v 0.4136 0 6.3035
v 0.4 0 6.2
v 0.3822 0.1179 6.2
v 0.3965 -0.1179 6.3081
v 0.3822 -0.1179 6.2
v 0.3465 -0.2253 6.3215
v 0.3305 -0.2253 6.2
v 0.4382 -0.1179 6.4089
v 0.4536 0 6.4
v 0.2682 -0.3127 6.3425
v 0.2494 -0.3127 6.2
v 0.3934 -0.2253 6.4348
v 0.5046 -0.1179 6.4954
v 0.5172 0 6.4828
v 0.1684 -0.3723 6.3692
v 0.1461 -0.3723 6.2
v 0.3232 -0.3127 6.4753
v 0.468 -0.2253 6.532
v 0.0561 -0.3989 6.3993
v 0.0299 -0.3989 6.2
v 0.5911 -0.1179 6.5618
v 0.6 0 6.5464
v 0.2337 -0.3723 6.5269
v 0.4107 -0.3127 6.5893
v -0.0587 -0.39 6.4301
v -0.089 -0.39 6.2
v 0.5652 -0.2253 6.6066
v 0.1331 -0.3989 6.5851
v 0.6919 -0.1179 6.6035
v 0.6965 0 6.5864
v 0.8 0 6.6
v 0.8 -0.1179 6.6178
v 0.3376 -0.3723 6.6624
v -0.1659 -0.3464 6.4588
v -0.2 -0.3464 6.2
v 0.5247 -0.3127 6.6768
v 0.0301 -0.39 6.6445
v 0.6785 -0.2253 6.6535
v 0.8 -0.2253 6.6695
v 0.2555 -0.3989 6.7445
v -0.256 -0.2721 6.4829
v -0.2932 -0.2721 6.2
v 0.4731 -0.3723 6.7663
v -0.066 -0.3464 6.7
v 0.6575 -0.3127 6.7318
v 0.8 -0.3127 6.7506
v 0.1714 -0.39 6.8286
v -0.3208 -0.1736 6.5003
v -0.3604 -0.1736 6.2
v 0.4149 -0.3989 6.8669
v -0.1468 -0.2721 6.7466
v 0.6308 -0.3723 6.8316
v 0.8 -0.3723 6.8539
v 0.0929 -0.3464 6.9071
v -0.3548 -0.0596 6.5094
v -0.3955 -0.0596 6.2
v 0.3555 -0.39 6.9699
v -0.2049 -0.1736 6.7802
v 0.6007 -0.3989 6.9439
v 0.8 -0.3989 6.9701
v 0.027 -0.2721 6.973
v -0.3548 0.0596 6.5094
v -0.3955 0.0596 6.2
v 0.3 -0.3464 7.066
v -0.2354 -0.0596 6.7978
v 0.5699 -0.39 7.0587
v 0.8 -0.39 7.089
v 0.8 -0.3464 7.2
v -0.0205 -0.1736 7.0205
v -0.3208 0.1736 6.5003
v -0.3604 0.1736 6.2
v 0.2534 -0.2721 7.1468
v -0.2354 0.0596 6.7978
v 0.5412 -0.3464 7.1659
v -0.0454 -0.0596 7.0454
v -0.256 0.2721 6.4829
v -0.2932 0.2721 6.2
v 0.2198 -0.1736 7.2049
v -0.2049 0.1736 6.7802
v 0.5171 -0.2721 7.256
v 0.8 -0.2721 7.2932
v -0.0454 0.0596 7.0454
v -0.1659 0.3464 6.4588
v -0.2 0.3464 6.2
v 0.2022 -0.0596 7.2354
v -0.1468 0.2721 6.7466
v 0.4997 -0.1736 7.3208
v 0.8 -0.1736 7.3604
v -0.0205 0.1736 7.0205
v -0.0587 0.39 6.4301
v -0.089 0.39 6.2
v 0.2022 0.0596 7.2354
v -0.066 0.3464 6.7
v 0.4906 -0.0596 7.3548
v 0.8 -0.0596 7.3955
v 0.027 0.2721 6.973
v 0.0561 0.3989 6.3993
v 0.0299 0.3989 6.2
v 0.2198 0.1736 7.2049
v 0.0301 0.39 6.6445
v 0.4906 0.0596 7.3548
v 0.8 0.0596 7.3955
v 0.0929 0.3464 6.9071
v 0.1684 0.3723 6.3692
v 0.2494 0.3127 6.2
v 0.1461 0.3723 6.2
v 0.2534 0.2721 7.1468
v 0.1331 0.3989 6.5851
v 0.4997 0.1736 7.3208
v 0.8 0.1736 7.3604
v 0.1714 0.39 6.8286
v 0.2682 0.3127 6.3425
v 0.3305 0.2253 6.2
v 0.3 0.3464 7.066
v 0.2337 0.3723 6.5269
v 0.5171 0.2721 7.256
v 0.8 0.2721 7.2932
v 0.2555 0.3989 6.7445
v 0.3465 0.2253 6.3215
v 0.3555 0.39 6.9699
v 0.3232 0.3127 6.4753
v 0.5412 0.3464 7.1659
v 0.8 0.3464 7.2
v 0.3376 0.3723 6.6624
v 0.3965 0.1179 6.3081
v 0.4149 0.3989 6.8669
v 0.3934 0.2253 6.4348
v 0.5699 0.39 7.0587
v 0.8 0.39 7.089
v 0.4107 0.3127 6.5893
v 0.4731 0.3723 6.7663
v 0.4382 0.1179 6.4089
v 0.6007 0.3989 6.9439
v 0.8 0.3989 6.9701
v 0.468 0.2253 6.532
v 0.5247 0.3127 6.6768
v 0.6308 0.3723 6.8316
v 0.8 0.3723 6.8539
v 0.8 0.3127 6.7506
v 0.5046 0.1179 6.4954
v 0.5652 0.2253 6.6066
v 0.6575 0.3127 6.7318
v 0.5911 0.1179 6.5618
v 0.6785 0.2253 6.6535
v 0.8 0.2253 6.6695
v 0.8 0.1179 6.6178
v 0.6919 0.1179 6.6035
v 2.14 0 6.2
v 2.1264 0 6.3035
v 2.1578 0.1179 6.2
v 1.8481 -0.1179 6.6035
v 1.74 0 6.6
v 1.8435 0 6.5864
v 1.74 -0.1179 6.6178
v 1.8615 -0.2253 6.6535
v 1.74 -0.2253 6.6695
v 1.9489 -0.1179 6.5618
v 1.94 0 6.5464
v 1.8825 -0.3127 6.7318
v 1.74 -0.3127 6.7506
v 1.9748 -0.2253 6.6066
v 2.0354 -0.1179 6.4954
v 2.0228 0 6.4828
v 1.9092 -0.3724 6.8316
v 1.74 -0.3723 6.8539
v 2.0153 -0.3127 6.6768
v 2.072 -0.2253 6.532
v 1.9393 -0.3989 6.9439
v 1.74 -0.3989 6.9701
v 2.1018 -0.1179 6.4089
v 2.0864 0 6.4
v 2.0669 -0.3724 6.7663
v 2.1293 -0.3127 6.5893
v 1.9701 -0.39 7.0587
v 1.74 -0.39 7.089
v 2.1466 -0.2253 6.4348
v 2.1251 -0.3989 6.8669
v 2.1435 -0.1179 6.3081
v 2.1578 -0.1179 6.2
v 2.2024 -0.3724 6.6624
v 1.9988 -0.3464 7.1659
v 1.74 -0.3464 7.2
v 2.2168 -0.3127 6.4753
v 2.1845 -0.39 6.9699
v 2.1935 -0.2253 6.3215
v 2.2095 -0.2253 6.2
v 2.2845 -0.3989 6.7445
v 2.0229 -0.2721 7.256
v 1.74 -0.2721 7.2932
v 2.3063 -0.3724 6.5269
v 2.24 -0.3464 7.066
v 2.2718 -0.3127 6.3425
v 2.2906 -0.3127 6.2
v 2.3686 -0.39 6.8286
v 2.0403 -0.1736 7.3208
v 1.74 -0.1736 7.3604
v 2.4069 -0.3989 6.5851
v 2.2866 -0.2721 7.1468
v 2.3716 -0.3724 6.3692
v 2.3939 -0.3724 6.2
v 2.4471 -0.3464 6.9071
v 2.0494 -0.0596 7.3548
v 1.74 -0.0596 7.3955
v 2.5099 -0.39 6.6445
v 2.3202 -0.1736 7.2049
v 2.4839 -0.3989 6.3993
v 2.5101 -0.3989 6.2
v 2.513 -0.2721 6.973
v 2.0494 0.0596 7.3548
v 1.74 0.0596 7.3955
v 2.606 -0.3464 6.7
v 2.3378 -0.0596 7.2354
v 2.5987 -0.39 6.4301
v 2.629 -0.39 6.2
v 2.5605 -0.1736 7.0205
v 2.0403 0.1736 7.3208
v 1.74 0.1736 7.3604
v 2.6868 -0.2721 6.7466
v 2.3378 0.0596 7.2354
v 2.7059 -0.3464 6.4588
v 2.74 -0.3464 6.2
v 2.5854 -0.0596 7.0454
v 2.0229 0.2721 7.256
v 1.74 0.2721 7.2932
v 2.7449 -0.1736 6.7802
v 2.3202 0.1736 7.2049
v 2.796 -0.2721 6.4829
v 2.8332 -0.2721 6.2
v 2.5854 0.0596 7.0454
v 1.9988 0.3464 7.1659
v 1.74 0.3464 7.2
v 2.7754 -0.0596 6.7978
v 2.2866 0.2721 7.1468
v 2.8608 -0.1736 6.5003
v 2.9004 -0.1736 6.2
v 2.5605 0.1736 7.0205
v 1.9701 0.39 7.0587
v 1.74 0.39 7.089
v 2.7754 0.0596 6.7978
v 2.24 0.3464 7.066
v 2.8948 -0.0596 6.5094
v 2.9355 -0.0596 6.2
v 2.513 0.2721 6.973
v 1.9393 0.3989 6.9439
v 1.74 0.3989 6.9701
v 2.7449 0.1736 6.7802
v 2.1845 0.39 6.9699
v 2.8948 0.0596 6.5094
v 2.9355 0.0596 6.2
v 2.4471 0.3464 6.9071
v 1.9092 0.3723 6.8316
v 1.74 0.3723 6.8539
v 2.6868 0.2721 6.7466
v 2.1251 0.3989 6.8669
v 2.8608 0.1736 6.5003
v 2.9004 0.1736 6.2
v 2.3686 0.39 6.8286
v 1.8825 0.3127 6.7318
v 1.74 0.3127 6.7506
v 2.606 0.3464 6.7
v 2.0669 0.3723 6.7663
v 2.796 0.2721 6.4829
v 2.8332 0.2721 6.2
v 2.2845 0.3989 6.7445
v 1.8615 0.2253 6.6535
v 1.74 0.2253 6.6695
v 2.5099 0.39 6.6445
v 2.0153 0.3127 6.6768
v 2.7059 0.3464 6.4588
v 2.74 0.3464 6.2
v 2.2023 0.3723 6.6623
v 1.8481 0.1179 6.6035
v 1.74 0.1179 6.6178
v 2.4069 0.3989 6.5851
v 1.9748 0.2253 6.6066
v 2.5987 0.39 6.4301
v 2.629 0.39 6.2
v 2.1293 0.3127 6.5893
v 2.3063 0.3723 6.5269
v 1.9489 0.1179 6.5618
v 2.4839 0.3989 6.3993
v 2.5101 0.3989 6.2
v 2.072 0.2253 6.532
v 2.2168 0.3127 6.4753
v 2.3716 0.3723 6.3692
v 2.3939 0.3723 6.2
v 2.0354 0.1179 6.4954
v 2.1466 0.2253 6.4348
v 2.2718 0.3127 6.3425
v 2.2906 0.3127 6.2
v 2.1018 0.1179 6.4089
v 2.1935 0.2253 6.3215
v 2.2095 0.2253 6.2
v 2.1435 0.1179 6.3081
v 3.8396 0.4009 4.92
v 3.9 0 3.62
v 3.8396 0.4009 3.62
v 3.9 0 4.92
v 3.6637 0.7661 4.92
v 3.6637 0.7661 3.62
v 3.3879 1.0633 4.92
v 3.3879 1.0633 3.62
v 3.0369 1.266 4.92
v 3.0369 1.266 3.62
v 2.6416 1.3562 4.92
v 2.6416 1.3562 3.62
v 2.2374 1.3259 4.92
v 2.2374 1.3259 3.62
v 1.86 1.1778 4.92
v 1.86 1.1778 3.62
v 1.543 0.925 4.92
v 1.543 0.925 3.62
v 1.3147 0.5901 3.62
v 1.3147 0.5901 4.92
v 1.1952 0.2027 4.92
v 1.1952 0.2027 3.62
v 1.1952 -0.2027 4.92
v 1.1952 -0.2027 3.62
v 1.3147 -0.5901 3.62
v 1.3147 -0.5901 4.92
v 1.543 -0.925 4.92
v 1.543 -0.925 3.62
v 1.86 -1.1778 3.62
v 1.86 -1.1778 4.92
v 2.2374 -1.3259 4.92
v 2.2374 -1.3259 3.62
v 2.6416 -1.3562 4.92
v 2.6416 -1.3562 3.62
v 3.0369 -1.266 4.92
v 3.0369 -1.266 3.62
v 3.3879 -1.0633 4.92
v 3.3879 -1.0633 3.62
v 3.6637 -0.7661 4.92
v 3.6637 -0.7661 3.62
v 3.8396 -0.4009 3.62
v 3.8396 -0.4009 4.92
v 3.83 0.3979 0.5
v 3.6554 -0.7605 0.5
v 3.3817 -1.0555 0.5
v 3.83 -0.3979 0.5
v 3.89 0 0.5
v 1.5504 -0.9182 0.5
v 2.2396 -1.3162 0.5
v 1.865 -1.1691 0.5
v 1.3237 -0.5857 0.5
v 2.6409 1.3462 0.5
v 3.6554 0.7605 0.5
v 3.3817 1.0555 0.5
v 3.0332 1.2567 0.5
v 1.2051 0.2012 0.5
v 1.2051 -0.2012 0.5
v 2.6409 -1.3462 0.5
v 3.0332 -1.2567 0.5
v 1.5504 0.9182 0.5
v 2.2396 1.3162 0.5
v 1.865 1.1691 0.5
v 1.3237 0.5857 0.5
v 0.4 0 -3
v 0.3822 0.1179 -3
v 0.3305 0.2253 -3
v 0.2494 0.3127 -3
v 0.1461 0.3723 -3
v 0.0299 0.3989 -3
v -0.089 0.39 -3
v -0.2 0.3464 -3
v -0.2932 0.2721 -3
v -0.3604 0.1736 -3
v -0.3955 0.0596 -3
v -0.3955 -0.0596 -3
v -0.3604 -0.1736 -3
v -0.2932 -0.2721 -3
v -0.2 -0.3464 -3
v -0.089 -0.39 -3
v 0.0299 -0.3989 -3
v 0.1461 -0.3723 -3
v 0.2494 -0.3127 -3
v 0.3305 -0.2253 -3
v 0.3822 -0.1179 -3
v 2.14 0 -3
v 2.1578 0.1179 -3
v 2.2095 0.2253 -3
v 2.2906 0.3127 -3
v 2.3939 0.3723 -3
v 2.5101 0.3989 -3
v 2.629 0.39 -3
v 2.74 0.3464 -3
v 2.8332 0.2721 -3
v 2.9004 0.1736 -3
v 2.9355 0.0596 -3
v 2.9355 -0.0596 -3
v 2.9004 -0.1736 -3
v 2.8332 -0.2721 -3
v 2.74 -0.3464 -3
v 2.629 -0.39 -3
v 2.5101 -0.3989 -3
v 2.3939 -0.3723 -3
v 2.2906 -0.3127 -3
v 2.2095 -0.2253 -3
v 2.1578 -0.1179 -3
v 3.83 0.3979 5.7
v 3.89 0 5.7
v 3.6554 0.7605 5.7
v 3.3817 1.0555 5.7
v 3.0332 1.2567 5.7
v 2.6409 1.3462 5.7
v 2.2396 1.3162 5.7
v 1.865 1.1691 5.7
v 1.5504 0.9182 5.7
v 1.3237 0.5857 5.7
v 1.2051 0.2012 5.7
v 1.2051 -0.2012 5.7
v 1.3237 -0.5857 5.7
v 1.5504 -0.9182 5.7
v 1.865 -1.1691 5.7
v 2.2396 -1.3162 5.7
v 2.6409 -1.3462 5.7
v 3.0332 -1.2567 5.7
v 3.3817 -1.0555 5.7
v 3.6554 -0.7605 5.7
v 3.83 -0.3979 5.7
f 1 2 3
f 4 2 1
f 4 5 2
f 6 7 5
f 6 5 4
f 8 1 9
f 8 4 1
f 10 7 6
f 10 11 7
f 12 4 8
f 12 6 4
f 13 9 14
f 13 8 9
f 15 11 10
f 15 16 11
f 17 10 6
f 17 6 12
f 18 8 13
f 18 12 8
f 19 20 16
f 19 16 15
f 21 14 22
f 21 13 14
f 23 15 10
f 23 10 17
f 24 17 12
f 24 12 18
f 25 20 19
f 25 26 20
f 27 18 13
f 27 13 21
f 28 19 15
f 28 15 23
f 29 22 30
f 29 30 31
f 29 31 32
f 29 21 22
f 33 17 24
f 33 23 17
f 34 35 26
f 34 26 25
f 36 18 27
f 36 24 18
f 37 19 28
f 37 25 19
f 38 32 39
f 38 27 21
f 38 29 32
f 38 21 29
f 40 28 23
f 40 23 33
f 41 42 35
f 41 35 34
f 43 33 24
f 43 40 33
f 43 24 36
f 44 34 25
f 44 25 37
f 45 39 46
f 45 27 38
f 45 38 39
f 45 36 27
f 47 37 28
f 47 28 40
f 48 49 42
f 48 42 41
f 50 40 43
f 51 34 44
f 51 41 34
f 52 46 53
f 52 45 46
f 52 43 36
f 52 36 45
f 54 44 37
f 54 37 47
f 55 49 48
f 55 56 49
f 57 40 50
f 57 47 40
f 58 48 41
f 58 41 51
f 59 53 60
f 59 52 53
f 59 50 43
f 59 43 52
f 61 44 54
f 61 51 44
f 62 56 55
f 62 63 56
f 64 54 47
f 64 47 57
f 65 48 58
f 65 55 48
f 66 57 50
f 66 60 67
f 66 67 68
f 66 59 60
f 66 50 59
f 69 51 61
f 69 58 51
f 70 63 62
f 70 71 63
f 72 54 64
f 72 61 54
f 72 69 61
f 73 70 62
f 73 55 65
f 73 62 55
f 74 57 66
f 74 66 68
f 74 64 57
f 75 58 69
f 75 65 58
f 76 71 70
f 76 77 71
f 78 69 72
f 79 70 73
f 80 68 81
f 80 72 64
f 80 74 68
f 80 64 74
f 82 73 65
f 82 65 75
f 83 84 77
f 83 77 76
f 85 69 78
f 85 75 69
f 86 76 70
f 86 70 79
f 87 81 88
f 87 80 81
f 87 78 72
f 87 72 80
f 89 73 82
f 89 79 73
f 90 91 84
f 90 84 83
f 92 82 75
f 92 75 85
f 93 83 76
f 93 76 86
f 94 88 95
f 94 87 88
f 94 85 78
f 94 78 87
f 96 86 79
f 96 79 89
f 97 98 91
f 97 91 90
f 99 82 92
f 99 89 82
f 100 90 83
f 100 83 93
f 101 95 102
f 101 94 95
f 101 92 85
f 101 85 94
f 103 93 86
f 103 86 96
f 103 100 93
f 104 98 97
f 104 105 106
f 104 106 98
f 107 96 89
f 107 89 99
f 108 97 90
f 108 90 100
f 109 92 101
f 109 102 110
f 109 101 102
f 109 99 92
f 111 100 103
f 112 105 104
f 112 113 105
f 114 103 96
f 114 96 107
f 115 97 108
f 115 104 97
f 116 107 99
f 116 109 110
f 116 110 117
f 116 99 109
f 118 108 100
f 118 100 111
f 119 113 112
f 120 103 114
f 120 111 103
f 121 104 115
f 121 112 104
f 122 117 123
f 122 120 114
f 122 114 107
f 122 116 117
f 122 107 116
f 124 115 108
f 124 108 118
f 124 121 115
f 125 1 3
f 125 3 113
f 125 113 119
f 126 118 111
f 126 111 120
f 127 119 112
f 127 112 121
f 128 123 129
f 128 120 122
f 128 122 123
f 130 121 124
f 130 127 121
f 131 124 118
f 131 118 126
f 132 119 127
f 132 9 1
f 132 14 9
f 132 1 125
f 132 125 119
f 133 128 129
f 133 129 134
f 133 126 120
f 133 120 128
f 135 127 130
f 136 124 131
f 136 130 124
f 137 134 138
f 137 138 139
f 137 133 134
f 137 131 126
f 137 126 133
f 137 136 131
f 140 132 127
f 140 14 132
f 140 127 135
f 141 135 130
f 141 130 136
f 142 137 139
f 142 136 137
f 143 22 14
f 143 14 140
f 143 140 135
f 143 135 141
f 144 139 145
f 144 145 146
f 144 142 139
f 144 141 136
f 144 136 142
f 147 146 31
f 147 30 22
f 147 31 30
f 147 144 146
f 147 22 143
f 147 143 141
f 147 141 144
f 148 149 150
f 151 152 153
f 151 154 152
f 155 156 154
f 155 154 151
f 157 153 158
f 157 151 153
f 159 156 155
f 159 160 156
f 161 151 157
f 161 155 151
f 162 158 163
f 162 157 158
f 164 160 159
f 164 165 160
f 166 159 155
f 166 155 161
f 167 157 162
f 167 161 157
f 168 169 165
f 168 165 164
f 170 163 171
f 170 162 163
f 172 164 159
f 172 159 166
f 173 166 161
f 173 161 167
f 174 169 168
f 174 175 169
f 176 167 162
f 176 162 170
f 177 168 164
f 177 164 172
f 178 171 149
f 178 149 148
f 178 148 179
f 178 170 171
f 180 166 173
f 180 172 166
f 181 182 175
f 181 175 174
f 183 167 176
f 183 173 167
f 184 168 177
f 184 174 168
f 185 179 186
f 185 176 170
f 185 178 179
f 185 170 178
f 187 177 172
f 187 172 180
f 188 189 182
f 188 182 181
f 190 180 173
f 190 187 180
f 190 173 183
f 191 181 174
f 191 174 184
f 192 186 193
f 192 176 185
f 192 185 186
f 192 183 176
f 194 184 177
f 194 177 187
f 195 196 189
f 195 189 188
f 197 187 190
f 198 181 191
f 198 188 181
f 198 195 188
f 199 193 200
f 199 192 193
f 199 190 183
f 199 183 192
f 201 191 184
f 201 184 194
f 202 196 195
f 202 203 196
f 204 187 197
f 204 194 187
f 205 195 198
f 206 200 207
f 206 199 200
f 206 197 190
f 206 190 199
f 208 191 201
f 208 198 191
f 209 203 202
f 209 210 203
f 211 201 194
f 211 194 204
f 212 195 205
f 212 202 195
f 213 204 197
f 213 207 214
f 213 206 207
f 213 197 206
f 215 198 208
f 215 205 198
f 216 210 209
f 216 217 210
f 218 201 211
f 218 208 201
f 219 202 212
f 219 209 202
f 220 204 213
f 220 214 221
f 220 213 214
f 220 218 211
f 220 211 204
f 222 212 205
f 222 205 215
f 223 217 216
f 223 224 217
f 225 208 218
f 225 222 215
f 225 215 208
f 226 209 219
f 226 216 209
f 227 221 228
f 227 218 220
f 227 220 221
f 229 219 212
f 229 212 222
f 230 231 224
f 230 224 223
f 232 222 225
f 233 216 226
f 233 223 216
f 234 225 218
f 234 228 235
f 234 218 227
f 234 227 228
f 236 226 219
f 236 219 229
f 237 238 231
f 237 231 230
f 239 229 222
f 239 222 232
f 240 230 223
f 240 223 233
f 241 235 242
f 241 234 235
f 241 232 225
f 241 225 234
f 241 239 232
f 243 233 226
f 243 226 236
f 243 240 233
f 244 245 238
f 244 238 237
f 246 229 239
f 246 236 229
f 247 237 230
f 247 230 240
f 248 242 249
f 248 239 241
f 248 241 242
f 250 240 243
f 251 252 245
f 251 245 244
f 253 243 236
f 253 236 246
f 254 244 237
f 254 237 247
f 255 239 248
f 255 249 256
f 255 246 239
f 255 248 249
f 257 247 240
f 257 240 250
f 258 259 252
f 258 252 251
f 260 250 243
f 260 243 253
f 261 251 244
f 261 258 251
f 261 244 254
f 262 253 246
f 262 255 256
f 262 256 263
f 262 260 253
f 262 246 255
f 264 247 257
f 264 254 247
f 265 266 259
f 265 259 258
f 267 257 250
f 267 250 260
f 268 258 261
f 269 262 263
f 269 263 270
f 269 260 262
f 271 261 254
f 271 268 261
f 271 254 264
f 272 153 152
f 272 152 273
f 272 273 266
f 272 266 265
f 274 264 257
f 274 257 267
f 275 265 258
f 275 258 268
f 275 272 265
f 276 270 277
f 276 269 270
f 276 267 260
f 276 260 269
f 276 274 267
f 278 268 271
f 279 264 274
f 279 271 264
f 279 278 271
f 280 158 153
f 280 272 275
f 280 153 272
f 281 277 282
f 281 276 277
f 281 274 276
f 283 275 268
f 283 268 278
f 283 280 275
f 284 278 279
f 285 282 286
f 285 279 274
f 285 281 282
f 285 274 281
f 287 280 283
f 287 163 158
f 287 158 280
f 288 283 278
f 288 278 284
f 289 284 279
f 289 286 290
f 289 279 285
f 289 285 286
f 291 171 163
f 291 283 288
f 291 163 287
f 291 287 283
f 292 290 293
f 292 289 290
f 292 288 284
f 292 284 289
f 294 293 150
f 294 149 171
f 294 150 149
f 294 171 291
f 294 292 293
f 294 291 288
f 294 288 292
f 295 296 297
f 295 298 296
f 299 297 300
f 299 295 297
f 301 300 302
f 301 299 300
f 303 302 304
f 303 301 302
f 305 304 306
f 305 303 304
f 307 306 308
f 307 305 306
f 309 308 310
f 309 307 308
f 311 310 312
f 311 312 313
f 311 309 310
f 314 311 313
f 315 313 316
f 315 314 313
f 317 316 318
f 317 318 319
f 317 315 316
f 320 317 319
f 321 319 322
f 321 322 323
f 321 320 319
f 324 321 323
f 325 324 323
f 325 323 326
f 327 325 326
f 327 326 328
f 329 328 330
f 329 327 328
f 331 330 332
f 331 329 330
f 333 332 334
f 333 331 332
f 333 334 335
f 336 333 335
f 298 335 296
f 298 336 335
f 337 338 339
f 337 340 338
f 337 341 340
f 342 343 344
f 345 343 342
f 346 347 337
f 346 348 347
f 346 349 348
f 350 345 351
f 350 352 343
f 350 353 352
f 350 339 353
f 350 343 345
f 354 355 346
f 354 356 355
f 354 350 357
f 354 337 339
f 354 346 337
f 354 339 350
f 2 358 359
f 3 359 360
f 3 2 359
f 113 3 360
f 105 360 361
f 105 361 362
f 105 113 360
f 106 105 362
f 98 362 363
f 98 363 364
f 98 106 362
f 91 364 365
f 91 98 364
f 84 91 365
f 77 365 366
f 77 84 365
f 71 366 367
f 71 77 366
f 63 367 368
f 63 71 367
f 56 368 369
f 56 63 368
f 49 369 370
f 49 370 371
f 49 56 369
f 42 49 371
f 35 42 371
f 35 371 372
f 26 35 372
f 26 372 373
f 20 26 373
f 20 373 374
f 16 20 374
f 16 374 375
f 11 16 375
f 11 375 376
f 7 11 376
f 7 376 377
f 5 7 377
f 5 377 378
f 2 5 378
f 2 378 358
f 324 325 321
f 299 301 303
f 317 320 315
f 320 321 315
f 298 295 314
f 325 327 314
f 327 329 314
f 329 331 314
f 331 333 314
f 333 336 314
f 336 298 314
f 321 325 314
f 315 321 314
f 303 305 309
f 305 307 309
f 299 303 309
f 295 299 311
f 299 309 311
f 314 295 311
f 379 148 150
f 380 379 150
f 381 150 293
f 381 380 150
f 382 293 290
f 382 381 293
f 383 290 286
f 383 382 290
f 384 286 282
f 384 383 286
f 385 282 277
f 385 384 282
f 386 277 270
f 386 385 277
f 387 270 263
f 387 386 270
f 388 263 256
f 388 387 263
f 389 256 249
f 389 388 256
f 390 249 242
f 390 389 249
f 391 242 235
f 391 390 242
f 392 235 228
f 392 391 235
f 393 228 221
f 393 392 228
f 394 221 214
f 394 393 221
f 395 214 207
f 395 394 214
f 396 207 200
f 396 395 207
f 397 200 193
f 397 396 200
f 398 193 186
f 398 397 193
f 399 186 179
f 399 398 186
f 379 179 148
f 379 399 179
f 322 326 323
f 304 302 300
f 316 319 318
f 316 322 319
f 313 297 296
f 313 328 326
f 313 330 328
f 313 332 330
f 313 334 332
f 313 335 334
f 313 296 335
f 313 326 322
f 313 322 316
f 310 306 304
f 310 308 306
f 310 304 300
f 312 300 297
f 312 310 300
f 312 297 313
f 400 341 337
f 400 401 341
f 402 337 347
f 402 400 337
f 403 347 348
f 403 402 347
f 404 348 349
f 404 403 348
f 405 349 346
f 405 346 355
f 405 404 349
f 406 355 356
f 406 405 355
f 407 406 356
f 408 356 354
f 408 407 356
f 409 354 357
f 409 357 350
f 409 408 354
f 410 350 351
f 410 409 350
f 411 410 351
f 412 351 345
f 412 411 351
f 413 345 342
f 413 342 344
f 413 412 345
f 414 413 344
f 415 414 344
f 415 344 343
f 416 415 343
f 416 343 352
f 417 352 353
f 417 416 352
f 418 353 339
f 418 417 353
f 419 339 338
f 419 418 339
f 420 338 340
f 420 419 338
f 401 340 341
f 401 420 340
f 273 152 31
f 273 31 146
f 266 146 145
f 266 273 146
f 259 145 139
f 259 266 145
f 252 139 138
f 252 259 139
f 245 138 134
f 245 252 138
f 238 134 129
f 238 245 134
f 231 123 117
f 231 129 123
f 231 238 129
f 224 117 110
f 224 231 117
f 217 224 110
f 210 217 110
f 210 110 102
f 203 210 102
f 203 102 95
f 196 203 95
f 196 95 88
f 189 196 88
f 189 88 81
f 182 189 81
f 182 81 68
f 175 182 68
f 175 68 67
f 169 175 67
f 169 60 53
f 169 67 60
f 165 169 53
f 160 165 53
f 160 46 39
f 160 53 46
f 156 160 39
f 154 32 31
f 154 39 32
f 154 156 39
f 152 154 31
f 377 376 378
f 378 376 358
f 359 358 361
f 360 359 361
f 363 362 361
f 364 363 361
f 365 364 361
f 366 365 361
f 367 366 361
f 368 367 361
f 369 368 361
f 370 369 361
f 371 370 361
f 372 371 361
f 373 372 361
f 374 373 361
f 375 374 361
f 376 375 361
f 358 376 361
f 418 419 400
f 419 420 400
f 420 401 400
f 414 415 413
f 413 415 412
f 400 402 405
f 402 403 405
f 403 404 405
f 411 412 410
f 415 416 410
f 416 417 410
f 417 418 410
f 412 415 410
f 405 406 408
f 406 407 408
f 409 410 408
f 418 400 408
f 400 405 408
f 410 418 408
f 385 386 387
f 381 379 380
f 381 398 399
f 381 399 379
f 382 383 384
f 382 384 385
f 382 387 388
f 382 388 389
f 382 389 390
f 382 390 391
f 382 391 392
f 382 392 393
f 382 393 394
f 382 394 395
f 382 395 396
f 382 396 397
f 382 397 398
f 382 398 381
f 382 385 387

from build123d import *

# Parameters (mm, degrees)
SKETCH001_R = 0.4
SKETCH002_W = 1.35
SKETCH002_H = 5.2
SKETCH003_W = 1.36
SKETCH003_H = 1.3


with BuildPart() as sweep_body:
    # Sweep: sweep along a path in Sketch
    with BuildLine(Plane.XZ) as sweep_path:
        Line((0, -3), (0, 6.2))
        ThreePointArc((0, 6.2), (0.234315, 6.765685), (0.8, 7))
        Line((0.8, 7), (1.74, 7))
        ThreePointArc((1.74, 7), (2.305685, 6.765685), (2.54, 6.2))
        Line((2.54, 6.2), (2.54, -3))
    # Sketch001 → Sweep (sweep)
    with BuildSketch(Plane.XY):
        Circle(SKETCH001_R)
    sweep(path=sweep_path.line)


with BuildPart() as revolution:
    # Sketch002 → Revolution (revolve)
    with BuildSketch(Plane.XZ):
        with Locations((3.215, 3.1)):
            Rectangle(SKETCH002_W, SKETCH002_H)
    revolve(axis=Axis((2.54, 0, 0.5), (0, 0, 1)))


with BuildPart() as revolution001:
    # Sketch003 → Revolution001 (revolve)
    with BuildSketch(Plane.XZ):
        with Locations((3.22, 4.27)):
            Rectangle(SKETCH003_W, SKETCH003_H)
    revolve(axis=Axis((2.54, 0, 3.62), (0, 0, 1)))


solid = Compound([sweep_body.part, revolution.part, revolution001.part])
